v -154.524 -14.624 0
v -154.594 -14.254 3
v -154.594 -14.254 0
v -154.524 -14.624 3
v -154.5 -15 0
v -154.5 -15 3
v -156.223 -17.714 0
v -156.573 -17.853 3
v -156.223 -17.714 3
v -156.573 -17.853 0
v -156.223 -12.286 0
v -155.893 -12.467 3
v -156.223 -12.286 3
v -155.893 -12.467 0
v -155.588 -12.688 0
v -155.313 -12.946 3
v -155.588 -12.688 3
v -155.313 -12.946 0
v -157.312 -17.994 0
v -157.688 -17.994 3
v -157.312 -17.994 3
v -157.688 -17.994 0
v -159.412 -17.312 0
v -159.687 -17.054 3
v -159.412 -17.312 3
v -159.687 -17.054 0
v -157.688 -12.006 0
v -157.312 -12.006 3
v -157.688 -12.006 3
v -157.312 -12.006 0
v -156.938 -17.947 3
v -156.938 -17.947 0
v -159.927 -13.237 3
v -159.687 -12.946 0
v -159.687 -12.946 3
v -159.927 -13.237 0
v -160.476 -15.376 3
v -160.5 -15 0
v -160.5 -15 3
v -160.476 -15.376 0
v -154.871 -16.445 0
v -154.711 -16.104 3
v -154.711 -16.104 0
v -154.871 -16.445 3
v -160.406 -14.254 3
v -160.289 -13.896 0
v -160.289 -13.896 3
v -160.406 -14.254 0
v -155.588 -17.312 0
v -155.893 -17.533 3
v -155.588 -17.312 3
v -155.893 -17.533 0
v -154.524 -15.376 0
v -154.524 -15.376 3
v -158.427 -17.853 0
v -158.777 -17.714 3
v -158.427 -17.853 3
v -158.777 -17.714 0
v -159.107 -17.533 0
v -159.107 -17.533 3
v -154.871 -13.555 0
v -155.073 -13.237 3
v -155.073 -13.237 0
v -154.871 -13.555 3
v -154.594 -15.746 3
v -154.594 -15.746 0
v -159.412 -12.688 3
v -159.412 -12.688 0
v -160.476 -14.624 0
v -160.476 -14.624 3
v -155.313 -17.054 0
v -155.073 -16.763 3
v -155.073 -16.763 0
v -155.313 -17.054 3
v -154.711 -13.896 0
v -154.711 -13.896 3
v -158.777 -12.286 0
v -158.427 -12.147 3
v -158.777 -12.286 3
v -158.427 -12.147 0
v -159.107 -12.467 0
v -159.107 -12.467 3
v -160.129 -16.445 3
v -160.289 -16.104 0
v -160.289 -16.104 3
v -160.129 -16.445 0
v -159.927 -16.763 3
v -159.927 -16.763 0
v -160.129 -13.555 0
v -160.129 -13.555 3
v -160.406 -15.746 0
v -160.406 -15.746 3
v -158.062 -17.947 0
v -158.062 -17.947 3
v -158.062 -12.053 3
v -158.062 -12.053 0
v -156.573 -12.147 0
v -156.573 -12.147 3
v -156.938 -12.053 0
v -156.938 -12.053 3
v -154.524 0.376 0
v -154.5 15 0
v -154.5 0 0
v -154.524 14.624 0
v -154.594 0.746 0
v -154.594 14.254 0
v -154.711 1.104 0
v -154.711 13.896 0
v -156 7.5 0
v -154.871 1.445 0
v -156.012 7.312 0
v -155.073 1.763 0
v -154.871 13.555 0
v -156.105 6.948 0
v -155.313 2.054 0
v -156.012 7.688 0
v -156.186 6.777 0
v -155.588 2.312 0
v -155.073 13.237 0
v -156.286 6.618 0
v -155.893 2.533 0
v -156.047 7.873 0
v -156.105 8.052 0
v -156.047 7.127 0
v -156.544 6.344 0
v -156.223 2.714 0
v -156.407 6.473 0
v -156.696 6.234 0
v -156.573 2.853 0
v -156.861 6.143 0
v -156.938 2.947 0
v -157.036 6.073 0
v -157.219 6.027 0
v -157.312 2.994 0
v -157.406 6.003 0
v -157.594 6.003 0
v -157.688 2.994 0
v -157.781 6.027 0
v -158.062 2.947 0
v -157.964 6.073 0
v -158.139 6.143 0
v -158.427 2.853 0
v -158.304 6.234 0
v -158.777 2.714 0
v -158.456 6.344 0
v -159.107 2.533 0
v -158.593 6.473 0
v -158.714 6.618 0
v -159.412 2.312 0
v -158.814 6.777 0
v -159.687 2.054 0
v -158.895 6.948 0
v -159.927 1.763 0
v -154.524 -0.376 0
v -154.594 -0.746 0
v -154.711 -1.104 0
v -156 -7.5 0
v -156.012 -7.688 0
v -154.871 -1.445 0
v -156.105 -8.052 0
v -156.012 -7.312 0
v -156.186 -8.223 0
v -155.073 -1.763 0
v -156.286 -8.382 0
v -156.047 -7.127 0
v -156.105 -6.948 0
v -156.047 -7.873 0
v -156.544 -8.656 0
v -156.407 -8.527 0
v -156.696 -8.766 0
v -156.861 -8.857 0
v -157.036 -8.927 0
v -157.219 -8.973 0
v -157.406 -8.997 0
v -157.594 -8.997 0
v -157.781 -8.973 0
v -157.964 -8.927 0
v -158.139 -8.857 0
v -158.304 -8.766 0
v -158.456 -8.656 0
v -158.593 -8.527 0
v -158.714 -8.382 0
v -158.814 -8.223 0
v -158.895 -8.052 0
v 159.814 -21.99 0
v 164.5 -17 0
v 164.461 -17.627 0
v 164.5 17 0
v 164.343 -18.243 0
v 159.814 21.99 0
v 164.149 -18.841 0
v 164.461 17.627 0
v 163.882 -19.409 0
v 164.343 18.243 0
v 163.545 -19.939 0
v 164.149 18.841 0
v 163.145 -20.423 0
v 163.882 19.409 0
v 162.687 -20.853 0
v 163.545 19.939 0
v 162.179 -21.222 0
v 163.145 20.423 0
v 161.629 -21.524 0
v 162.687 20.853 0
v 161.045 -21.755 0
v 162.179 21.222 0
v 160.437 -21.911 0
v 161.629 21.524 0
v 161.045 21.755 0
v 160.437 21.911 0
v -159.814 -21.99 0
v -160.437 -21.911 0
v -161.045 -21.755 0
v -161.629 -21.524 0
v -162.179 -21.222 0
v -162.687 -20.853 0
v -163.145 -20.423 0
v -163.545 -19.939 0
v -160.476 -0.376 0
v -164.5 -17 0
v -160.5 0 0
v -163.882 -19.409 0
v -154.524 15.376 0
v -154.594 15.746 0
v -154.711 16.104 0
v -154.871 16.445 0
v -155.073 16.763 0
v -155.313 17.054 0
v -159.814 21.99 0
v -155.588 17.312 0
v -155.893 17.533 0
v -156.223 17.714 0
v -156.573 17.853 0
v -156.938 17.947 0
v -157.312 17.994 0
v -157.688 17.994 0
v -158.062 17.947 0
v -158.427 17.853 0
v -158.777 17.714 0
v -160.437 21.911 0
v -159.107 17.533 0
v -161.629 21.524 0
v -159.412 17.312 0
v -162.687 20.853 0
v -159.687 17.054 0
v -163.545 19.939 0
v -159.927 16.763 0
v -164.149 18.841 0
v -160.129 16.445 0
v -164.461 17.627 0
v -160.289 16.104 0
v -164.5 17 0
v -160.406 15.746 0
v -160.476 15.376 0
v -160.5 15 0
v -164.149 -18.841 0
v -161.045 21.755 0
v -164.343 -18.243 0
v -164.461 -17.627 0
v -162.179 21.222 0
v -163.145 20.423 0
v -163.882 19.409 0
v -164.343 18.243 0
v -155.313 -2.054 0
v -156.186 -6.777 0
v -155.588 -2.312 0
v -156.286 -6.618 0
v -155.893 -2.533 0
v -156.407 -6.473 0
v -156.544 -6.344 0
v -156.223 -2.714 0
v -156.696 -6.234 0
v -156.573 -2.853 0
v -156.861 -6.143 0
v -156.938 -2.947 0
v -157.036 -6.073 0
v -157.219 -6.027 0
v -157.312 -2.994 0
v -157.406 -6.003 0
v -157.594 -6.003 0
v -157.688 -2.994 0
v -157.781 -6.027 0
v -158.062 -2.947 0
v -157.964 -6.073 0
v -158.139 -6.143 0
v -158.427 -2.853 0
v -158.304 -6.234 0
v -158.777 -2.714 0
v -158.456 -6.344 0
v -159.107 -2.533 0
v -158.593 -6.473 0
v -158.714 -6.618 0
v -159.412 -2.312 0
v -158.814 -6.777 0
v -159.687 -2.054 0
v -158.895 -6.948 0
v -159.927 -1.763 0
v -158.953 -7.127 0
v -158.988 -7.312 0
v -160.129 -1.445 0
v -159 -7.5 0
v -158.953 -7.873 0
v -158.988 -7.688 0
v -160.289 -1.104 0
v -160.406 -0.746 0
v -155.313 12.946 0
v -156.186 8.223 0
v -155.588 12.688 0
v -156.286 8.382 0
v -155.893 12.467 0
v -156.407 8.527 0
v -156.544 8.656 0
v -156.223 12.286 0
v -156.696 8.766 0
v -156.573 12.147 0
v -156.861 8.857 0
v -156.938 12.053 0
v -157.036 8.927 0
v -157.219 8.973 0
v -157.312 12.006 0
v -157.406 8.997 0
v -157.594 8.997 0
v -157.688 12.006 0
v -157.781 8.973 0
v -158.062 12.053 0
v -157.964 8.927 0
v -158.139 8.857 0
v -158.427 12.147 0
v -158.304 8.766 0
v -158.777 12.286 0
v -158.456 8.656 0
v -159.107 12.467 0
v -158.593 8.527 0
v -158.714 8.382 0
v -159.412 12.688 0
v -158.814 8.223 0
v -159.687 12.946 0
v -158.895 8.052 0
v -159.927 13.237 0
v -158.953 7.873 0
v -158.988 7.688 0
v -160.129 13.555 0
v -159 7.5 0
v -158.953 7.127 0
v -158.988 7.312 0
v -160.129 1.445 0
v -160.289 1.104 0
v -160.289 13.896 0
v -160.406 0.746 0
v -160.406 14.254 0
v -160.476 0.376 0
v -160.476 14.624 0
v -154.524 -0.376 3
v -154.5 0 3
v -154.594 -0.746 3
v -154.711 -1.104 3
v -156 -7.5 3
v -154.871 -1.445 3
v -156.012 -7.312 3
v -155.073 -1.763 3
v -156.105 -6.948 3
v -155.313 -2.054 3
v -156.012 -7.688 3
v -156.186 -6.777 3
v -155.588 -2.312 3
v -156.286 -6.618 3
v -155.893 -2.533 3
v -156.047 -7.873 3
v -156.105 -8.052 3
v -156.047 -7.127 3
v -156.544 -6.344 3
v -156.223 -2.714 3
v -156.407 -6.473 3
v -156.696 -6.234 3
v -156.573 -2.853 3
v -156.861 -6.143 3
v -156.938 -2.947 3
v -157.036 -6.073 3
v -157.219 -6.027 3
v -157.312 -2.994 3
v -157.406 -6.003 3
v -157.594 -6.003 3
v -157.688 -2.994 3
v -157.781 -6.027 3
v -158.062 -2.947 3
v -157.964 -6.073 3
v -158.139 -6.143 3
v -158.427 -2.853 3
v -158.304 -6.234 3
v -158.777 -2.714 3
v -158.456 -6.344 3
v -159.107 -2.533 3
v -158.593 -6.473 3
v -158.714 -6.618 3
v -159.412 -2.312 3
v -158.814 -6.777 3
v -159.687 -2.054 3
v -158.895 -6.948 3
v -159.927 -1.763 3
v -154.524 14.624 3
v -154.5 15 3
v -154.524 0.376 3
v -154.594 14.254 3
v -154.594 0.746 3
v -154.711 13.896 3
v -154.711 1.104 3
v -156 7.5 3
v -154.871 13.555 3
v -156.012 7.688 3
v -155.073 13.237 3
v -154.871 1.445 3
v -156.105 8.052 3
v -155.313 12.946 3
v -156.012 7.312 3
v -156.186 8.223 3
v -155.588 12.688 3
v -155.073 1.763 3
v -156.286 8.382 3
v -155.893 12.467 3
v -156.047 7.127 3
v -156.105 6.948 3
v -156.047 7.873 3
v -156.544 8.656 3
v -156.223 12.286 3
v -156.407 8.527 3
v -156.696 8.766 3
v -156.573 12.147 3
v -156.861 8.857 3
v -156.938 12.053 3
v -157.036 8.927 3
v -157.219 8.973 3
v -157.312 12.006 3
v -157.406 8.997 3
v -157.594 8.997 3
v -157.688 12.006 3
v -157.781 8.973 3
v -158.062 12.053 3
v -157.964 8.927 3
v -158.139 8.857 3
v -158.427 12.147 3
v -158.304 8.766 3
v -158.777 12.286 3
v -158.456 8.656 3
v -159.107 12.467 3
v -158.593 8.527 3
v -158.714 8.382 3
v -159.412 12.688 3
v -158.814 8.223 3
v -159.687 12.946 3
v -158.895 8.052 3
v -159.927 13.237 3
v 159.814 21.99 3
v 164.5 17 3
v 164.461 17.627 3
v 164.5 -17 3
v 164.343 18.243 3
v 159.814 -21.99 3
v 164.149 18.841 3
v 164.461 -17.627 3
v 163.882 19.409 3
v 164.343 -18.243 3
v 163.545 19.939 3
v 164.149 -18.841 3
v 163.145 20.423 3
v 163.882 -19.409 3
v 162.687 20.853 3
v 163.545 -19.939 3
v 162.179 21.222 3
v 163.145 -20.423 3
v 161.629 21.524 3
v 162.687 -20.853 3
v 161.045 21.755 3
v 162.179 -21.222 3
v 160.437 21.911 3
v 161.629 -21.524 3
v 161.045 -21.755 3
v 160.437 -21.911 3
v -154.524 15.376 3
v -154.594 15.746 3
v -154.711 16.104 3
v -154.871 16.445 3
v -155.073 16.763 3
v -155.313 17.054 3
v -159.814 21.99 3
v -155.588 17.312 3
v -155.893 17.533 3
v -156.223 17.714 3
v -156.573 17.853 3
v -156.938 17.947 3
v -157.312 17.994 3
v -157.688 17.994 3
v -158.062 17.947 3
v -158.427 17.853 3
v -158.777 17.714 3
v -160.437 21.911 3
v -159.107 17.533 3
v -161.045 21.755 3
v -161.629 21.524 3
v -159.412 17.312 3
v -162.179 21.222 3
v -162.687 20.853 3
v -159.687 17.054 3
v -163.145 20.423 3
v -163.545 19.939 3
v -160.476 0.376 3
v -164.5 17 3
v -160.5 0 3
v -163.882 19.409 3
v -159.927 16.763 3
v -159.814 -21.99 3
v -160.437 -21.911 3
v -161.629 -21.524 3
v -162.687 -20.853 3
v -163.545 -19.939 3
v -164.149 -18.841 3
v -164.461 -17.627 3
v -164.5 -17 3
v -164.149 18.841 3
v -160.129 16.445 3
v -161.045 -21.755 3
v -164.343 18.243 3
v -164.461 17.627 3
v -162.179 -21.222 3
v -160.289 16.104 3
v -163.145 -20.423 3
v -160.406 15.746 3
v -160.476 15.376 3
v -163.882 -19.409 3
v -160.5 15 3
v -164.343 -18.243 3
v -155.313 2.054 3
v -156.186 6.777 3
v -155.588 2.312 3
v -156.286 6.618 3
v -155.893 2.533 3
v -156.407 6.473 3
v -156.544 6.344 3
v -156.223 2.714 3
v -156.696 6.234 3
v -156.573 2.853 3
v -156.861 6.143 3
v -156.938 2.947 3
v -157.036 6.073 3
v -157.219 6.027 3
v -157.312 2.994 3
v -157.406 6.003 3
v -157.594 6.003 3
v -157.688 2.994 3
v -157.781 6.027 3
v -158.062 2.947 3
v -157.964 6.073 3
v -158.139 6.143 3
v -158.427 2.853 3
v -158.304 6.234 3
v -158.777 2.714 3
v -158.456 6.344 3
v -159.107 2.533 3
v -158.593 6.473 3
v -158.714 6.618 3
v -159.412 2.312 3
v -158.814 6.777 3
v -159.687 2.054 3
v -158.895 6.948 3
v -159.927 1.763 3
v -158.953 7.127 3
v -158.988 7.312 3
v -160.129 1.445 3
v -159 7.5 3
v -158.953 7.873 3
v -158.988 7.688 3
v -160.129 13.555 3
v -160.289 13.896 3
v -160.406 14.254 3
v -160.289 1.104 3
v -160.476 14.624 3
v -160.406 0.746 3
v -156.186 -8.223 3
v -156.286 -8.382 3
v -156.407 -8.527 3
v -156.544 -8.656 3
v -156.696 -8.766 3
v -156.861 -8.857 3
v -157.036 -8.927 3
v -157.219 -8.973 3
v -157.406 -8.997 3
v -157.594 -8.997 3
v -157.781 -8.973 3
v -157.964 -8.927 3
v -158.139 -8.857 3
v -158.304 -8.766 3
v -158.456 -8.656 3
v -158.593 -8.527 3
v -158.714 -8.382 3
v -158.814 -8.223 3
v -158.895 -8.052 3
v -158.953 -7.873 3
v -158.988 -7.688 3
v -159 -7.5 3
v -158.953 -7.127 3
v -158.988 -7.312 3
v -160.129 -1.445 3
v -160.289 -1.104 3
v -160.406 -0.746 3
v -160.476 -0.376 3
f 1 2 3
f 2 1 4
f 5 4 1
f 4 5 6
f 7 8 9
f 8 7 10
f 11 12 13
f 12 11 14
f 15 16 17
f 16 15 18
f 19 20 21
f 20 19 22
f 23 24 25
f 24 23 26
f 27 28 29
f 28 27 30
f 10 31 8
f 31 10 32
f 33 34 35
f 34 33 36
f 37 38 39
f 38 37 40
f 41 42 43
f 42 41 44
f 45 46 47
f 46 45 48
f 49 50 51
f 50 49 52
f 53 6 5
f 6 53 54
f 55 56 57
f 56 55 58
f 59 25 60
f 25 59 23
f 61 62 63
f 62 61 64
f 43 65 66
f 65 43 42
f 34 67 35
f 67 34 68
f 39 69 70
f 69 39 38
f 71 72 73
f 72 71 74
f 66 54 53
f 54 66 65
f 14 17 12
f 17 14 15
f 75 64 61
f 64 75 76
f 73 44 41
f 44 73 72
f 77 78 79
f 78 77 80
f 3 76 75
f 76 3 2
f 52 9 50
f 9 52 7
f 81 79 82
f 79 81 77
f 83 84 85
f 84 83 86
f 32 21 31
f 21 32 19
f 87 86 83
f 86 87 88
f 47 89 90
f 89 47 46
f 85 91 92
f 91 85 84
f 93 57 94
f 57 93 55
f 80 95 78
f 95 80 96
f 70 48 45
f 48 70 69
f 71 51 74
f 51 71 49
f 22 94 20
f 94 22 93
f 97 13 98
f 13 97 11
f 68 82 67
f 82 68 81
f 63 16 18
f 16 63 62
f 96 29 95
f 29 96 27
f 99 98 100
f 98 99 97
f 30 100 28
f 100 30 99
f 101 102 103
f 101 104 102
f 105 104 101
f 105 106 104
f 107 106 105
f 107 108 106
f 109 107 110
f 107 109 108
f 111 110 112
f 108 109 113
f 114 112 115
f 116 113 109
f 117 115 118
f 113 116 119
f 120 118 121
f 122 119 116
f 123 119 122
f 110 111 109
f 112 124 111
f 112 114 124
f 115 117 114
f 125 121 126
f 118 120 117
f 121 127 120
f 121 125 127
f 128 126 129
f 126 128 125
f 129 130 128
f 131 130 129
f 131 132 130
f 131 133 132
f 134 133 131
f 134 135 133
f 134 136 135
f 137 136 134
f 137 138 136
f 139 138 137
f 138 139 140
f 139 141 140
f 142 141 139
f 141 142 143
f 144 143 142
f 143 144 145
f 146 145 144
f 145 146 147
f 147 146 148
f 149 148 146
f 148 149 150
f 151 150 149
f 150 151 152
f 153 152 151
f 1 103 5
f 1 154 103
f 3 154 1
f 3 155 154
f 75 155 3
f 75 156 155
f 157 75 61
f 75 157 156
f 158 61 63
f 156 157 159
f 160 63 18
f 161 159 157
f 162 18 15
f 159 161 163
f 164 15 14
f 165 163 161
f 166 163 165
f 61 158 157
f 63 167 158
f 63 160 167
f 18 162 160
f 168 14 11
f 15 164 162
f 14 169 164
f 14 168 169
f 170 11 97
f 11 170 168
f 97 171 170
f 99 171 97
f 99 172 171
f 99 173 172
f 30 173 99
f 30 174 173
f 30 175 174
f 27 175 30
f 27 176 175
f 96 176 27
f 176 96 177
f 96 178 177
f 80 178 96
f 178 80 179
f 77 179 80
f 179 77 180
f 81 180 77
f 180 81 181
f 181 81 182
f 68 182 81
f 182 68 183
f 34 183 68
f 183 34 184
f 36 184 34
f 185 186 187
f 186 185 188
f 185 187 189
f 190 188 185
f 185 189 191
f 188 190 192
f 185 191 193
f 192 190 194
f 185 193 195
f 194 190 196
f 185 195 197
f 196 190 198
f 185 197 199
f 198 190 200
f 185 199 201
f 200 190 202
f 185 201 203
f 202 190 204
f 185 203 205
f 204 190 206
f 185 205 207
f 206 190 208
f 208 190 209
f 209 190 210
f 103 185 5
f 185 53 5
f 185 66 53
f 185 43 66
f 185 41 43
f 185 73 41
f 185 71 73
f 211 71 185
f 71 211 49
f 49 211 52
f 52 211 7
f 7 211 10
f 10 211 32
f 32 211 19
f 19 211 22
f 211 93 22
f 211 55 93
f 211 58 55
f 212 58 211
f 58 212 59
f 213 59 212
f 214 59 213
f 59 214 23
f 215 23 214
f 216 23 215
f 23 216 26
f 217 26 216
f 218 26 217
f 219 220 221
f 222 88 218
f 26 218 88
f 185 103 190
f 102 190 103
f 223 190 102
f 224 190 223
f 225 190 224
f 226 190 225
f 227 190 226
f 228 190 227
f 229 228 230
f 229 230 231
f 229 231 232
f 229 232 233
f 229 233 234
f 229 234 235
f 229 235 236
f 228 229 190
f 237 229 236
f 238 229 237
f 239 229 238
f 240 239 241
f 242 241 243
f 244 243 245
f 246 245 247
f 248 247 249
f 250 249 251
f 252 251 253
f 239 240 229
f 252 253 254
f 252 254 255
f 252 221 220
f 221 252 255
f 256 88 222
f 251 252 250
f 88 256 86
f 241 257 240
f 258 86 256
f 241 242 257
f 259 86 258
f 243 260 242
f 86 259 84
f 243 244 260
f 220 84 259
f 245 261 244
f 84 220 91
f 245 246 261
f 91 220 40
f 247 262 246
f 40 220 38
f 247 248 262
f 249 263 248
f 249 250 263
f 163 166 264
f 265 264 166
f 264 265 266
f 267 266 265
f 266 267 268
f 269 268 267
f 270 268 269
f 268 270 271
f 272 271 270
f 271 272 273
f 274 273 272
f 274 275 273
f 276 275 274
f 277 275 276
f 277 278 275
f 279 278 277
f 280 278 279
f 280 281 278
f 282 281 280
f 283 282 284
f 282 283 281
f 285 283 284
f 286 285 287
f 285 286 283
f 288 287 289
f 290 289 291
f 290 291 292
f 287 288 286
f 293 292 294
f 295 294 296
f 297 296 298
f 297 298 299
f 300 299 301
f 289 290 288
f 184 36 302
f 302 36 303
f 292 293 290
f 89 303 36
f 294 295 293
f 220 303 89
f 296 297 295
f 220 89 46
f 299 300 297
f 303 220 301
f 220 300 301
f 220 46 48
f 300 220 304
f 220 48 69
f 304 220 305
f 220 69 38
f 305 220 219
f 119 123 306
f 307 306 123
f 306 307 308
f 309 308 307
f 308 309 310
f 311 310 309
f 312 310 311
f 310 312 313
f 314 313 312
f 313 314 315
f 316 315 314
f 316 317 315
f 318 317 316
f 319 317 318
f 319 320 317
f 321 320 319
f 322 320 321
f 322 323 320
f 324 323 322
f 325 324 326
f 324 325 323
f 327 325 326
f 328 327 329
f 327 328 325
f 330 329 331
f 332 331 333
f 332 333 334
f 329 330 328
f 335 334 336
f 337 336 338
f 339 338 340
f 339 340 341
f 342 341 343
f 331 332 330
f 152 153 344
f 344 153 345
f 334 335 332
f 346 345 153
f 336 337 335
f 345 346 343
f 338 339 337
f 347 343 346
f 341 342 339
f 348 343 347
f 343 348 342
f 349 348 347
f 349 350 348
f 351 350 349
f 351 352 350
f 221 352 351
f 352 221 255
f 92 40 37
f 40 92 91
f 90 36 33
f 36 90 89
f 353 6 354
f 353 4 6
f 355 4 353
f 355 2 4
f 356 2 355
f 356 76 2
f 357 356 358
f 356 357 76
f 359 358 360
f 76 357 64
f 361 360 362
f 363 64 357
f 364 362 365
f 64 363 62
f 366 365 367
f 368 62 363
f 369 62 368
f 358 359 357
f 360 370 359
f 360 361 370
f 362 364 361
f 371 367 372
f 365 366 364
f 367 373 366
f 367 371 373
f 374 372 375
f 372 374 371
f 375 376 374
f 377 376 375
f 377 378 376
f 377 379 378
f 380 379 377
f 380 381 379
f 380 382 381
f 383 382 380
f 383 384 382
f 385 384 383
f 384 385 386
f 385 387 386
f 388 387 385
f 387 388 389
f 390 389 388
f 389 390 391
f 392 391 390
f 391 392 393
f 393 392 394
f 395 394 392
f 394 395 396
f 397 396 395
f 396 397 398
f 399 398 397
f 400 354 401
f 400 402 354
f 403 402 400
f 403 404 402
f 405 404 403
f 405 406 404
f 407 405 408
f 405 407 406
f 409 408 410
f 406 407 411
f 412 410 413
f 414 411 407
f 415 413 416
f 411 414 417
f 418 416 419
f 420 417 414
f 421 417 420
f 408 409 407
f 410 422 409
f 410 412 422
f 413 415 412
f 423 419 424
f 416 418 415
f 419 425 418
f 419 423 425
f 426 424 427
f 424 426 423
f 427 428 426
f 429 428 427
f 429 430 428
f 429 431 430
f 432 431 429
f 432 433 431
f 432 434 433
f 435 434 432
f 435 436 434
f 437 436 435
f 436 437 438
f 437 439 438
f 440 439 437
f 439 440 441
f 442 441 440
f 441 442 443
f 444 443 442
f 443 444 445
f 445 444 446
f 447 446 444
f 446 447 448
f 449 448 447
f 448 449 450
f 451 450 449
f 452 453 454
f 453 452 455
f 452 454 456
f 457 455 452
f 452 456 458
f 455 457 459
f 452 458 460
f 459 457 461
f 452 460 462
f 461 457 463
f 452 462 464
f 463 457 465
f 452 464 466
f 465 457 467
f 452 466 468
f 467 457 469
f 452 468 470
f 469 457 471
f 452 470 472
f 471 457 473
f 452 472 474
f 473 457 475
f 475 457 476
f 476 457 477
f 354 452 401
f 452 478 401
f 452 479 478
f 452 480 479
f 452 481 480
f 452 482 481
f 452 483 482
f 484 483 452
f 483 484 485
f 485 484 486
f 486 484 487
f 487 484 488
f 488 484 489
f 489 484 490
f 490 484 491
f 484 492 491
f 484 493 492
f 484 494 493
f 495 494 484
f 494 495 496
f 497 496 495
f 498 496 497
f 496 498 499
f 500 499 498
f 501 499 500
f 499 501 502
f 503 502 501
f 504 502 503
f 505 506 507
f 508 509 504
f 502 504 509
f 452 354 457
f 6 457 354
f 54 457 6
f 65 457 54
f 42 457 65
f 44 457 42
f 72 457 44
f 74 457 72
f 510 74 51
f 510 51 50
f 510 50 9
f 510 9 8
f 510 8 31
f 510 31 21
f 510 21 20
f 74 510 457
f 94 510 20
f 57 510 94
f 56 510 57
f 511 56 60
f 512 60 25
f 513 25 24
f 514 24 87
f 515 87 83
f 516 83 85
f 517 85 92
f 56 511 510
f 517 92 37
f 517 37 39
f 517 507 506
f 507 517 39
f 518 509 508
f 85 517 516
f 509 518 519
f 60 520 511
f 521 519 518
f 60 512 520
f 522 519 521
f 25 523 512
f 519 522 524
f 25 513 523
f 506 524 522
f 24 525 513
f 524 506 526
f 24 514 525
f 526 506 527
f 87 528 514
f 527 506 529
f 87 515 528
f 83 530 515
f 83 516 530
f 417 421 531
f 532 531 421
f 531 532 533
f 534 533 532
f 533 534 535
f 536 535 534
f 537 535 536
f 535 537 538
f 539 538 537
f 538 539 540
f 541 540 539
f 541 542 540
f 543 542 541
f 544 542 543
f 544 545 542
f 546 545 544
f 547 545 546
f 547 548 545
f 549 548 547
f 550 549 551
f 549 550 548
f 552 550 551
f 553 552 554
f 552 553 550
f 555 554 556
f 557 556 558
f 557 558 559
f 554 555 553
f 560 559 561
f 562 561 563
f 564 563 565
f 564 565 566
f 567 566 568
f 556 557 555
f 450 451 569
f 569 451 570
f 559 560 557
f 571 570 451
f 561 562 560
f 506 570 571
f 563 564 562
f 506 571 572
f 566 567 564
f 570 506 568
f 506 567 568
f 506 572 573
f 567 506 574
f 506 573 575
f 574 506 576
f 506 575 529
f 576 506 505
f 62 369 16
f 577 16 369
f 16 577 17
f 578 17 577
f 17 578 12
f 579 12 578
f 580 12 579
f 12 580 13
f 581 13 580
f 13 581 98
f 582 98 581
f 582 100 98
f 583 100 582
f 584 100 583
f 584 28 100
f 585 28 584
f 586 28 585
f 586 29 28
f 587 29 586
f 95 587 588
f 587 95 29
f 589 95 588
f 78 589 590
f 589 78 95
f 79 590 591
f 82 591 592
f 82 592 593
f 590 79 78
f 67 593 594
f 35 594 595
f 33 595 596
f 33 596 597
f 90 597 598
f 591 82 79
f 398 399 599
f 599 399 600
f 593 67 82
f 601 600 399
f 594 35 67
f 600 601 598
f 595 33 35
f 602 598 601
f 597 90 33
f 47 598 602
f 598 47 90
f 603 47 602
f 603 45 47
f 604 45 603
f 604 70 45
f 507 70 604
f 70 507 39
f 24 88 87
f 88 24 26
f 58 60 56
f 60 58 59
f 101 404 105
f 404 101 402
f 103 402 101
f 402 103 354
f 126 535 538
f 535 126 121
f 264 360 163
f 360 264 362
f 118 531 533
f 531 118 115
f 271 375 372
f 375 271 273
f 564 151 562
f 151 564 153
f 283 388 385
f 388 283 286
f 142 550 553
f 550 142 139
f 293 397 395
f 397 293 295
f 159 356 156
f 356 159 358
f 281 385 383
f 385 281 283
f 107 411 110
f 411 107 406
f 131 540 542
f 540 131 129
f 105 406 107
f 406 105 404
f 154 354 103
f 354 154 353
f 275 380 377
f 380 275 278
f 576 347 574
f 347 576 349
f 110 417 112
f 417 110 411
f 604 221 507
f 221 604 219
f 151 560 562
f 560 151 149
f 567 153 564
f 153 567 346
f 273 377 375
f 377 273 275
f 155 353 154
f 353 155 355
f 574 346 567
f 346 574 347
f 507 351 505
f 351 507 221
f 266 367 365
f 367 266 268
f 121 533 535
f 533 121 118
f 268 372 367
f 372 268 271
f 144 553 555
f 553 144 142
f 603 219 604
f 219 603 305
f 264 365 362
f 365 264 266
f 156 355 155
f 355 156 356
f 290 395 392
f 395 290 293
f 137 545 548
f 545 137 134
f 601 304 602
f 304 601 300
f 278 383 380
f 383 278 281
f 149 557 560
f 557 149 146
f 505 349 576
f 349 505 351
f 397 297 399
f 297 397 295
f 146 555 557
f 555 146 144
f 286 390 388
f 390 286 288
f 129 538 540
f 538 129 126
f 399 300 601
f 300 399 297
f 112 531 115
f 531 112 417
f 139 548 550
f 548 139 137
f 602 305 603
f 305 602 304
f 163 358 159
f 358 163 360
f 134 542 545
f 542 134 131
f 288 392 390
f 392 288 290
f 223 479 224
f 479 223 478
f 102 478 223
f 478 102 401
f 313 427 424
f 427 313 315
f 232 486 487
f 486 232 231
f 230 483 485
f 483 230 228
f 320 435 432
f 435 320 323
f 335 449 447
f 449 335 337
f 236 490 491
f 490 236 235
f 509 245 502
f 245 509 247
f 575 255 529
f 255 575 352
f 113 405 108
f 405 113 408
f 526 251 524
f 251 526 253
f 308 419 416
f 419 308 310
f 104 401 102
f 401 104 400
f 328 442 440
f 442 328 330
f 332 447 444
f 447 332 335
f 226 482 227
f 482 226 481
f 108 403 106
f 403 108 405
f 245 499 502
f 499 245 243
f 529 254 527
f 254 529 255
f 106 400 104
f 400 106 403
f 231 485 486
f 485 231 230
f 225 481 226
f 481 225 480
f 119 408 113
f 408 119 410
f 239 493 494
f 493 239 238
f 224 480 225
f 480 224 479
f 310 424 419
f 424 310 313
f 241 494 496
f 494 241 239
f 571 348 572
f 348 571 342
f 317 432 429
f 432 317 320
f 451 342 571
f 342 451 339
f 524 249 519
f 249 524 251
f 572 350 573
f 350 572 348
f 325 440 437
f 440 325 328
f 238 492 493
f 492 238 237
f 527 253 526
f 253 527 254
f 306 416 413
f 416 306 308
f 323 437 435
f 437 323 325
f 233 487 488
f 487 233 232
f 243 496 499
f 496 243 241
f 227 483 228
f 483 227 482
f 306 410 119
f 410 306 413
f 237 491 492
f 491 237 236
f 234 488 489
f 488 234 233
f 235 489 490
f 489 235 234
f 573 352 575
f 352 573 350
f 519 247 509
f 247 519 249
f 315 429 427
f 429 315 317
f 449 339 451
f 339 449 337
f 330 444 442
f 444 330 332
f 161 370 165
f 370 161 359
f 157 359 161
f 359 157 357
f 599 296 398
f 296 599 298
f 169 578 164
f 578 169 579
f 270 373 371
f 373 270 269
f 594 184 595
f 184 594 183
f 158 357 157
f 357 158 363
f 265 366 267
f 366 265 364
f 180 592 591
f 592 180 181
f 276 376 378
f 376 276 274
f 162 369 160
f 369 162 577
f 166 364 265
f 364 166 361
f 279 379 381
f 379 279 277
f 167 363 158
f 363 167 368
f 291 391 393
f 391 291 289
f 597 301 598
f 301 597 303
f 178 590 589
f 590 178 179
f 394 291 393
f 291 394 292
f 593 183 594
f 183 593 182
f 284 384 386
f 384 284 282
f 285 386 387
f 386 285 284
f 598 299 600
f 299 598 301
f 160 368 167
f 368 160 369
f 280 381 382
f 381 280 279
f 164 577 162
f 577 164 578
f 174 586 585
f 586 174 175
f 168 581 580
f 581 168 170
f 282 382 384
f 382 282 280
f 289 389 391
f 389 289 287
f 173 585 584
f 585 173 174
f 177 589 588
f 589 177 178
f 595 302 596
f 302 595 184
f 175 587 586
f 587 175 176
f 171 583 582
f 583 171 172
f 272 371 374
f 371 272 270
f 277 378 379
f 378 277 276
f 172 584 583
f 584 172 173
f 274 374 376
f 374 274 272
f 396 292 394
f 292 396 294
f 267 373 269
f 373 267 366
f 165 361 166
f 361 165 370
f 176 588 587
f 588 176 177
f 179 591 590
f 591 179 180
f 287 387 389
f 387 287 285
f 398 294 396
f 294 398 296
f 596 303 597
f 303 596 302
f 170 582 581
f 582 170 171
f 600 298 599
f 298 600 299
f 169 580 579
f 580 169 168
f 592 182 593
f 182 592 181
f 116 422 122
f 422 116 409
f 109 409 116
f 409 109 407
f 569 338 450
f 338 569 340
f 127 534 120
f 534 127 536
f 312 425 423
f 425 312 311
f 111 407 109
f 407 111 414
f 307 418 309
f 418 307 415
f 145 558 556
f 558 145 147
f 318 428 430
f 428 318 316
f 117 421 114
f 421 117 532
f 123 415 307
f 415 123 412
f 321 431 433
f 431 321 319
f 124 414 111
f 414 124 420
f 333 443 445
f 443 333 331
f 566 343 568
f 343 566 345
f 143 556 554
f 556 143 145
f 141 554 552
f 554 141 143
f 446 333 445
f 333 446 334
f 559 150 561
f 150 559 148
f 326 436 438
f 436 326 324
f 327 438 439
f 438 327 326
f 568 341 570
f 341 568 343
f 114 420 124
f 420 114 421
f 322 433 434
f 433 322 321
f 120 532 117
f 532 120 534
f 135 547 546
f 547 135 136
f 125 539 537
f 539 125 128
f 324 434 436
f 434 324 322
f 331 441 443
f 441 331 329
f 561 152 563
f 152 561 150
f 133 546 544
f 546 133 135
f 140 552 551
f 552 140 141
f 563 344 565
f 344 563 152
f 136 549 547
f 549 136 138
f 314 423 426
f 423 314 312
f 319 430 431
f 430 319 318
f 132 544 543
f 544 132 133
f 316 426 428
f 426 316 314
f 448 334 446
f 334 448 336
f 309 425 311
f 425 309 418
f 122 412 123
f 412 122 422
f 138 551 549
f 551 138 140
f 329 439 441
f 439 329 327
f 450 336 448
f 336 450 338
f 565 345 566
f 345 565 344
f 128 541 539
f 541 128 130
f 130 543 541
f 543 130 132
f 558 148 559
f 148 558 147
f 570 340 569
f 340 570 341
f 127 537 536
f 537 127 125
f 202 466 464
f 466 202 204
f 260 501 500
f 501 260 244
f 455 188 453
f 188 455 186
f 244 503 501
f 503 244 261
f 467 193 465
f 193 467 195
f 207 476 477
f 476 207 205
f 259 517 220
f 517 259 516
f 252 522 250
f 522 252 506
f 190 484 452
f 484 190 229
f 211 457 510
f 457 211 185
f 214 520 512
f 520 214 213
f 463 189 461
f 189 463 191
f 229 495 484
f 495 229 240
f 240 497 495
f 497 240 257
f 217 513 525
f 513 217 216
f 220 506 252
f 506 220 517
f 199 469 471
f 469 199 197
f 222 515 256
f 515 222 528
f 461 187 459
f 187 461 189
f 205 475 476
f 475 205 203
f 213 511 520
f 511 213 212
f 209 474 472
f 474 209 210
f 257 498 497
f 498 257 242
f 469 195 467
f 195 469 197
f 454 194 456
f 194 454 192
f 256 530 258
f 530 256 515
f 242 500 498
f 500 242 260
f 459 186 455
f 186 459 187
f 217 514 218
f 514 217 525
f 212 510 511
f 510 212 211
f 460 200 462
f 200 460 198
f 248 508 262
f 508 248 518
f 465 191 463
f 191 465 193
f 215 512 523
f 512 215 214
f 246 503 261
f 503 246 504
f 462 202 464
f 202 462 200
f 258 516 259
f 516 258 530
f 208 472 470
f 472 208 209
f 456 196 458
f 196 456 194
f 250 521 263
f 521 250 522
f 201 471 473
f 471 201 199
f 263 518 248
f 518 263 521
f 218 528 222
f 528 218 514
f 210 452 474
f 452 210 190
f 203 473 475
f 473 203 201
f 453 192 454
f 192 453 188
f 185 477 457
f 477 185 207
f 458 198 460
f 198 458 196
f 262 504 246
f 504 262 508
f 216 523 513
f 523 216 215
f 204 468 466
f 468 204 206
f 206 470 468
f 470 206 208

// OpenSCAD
$fn = 50;


difference() {
	union() {
		hull() {
			translate(v = [-159.5000000000, 17.0000000000, 0]) {
				cylinder(h = 3, r = 5);
			}
			translate(v = [159.5000000000, 17.0000000000, 0]) {
				cylinder(h = 3, r = 5);
			}
			translate(v = [-159.5000000000, -17.0000000000, 0]) {
				cylinder(h = 3, r = 5);
			}
			translate(v = [159.5000000000, -17.0000000000, 0]) {
				cylinder(h = 3, r = 5);
			}
		}
	}
	union() {
		translate(v = [-157.5000000000, -15.0000000000, 0]) {
			cylinder(h = 3, r = 3.0000000000);
		}
		translate(v = [-157.5000000000, 0.0000000000, 0]) {
			cylinder(h = 3, r = 3.0000000000);
		}
		translate(v = [-157.5000000000, 15.0000000000, 0]) {
			cylinder(h = 3, r = 3.0000000000);
		}
		translate(v = [-157.5000000000, -15.0000000000, 0]) {
			cylinder(h = 3, r = 1.5000000000);
		}
		translate(v = [-157.5000000000, -7.5000000000, 0]) {
			cylinder(h = 3, r = 1.5000000000);
		}
		translate(v = [-157.5000000000, 0.0000000000, 0]) {
			cylinder(h = 3, r = 1.5000000000);
		}
		translate(v = [-157.5000000000, 7.5000000000, 0]) {
			cylinder(h = 3, r = 1.5000000000);
		}
		translate(v = [-157.5000000000, 15.0000000000, 0]) {
			cylinder(h = 3, r = 1.5000000000);
		}
		translate(v = [-157.5000000000, -15.0000000000, 0]) {
			cylinder(h = 3, r = 1.5000000000);
		}
		translate(v = [-157.5000000000, -7.5000000000, 0]) {
			cylinder(h = 3, r = 1.5000000000);
		}
		translate(v = [-157.5000000000, 0.0000000000, 0]) {
			cylinder(h = 3, r = 1.5000000000);
		}
		translate(v = [-157.5000000000, 7.5000000000, 0]) {
			cylinder(h = 3, r = 1.5000000000);
		}
		translate(v = [-157.5000000000, 15.0000000000, 0]) {
			cylinder(h = 3, r = 1.5000000000);
		}
		translate(v = [-157.5000000000, -15.0000000000, 0]) {
			cylinder(h = 3, r = 1.5000000000);
		}
		translate(v = [-157.5000000000, -7.5000000000, 0]) {
			cylinder(h = 3, r = 1.5000000000);
		}
		translate(v = [-157.5000000000, 0.0000000000, 0]) {
			cylinder(h = 3, r = 1.5000000000);
		}
		translate(v = [-157.5000000000, 7.5000000000, 0]) {
			cylinder(h = 3, r = 1.5000000000);
		}
		translate(v = [-157.5000000000, 15.0000000000, 0]) {
			cylinder(h = 3, r = 1.5000000000);
		}
	}
}
